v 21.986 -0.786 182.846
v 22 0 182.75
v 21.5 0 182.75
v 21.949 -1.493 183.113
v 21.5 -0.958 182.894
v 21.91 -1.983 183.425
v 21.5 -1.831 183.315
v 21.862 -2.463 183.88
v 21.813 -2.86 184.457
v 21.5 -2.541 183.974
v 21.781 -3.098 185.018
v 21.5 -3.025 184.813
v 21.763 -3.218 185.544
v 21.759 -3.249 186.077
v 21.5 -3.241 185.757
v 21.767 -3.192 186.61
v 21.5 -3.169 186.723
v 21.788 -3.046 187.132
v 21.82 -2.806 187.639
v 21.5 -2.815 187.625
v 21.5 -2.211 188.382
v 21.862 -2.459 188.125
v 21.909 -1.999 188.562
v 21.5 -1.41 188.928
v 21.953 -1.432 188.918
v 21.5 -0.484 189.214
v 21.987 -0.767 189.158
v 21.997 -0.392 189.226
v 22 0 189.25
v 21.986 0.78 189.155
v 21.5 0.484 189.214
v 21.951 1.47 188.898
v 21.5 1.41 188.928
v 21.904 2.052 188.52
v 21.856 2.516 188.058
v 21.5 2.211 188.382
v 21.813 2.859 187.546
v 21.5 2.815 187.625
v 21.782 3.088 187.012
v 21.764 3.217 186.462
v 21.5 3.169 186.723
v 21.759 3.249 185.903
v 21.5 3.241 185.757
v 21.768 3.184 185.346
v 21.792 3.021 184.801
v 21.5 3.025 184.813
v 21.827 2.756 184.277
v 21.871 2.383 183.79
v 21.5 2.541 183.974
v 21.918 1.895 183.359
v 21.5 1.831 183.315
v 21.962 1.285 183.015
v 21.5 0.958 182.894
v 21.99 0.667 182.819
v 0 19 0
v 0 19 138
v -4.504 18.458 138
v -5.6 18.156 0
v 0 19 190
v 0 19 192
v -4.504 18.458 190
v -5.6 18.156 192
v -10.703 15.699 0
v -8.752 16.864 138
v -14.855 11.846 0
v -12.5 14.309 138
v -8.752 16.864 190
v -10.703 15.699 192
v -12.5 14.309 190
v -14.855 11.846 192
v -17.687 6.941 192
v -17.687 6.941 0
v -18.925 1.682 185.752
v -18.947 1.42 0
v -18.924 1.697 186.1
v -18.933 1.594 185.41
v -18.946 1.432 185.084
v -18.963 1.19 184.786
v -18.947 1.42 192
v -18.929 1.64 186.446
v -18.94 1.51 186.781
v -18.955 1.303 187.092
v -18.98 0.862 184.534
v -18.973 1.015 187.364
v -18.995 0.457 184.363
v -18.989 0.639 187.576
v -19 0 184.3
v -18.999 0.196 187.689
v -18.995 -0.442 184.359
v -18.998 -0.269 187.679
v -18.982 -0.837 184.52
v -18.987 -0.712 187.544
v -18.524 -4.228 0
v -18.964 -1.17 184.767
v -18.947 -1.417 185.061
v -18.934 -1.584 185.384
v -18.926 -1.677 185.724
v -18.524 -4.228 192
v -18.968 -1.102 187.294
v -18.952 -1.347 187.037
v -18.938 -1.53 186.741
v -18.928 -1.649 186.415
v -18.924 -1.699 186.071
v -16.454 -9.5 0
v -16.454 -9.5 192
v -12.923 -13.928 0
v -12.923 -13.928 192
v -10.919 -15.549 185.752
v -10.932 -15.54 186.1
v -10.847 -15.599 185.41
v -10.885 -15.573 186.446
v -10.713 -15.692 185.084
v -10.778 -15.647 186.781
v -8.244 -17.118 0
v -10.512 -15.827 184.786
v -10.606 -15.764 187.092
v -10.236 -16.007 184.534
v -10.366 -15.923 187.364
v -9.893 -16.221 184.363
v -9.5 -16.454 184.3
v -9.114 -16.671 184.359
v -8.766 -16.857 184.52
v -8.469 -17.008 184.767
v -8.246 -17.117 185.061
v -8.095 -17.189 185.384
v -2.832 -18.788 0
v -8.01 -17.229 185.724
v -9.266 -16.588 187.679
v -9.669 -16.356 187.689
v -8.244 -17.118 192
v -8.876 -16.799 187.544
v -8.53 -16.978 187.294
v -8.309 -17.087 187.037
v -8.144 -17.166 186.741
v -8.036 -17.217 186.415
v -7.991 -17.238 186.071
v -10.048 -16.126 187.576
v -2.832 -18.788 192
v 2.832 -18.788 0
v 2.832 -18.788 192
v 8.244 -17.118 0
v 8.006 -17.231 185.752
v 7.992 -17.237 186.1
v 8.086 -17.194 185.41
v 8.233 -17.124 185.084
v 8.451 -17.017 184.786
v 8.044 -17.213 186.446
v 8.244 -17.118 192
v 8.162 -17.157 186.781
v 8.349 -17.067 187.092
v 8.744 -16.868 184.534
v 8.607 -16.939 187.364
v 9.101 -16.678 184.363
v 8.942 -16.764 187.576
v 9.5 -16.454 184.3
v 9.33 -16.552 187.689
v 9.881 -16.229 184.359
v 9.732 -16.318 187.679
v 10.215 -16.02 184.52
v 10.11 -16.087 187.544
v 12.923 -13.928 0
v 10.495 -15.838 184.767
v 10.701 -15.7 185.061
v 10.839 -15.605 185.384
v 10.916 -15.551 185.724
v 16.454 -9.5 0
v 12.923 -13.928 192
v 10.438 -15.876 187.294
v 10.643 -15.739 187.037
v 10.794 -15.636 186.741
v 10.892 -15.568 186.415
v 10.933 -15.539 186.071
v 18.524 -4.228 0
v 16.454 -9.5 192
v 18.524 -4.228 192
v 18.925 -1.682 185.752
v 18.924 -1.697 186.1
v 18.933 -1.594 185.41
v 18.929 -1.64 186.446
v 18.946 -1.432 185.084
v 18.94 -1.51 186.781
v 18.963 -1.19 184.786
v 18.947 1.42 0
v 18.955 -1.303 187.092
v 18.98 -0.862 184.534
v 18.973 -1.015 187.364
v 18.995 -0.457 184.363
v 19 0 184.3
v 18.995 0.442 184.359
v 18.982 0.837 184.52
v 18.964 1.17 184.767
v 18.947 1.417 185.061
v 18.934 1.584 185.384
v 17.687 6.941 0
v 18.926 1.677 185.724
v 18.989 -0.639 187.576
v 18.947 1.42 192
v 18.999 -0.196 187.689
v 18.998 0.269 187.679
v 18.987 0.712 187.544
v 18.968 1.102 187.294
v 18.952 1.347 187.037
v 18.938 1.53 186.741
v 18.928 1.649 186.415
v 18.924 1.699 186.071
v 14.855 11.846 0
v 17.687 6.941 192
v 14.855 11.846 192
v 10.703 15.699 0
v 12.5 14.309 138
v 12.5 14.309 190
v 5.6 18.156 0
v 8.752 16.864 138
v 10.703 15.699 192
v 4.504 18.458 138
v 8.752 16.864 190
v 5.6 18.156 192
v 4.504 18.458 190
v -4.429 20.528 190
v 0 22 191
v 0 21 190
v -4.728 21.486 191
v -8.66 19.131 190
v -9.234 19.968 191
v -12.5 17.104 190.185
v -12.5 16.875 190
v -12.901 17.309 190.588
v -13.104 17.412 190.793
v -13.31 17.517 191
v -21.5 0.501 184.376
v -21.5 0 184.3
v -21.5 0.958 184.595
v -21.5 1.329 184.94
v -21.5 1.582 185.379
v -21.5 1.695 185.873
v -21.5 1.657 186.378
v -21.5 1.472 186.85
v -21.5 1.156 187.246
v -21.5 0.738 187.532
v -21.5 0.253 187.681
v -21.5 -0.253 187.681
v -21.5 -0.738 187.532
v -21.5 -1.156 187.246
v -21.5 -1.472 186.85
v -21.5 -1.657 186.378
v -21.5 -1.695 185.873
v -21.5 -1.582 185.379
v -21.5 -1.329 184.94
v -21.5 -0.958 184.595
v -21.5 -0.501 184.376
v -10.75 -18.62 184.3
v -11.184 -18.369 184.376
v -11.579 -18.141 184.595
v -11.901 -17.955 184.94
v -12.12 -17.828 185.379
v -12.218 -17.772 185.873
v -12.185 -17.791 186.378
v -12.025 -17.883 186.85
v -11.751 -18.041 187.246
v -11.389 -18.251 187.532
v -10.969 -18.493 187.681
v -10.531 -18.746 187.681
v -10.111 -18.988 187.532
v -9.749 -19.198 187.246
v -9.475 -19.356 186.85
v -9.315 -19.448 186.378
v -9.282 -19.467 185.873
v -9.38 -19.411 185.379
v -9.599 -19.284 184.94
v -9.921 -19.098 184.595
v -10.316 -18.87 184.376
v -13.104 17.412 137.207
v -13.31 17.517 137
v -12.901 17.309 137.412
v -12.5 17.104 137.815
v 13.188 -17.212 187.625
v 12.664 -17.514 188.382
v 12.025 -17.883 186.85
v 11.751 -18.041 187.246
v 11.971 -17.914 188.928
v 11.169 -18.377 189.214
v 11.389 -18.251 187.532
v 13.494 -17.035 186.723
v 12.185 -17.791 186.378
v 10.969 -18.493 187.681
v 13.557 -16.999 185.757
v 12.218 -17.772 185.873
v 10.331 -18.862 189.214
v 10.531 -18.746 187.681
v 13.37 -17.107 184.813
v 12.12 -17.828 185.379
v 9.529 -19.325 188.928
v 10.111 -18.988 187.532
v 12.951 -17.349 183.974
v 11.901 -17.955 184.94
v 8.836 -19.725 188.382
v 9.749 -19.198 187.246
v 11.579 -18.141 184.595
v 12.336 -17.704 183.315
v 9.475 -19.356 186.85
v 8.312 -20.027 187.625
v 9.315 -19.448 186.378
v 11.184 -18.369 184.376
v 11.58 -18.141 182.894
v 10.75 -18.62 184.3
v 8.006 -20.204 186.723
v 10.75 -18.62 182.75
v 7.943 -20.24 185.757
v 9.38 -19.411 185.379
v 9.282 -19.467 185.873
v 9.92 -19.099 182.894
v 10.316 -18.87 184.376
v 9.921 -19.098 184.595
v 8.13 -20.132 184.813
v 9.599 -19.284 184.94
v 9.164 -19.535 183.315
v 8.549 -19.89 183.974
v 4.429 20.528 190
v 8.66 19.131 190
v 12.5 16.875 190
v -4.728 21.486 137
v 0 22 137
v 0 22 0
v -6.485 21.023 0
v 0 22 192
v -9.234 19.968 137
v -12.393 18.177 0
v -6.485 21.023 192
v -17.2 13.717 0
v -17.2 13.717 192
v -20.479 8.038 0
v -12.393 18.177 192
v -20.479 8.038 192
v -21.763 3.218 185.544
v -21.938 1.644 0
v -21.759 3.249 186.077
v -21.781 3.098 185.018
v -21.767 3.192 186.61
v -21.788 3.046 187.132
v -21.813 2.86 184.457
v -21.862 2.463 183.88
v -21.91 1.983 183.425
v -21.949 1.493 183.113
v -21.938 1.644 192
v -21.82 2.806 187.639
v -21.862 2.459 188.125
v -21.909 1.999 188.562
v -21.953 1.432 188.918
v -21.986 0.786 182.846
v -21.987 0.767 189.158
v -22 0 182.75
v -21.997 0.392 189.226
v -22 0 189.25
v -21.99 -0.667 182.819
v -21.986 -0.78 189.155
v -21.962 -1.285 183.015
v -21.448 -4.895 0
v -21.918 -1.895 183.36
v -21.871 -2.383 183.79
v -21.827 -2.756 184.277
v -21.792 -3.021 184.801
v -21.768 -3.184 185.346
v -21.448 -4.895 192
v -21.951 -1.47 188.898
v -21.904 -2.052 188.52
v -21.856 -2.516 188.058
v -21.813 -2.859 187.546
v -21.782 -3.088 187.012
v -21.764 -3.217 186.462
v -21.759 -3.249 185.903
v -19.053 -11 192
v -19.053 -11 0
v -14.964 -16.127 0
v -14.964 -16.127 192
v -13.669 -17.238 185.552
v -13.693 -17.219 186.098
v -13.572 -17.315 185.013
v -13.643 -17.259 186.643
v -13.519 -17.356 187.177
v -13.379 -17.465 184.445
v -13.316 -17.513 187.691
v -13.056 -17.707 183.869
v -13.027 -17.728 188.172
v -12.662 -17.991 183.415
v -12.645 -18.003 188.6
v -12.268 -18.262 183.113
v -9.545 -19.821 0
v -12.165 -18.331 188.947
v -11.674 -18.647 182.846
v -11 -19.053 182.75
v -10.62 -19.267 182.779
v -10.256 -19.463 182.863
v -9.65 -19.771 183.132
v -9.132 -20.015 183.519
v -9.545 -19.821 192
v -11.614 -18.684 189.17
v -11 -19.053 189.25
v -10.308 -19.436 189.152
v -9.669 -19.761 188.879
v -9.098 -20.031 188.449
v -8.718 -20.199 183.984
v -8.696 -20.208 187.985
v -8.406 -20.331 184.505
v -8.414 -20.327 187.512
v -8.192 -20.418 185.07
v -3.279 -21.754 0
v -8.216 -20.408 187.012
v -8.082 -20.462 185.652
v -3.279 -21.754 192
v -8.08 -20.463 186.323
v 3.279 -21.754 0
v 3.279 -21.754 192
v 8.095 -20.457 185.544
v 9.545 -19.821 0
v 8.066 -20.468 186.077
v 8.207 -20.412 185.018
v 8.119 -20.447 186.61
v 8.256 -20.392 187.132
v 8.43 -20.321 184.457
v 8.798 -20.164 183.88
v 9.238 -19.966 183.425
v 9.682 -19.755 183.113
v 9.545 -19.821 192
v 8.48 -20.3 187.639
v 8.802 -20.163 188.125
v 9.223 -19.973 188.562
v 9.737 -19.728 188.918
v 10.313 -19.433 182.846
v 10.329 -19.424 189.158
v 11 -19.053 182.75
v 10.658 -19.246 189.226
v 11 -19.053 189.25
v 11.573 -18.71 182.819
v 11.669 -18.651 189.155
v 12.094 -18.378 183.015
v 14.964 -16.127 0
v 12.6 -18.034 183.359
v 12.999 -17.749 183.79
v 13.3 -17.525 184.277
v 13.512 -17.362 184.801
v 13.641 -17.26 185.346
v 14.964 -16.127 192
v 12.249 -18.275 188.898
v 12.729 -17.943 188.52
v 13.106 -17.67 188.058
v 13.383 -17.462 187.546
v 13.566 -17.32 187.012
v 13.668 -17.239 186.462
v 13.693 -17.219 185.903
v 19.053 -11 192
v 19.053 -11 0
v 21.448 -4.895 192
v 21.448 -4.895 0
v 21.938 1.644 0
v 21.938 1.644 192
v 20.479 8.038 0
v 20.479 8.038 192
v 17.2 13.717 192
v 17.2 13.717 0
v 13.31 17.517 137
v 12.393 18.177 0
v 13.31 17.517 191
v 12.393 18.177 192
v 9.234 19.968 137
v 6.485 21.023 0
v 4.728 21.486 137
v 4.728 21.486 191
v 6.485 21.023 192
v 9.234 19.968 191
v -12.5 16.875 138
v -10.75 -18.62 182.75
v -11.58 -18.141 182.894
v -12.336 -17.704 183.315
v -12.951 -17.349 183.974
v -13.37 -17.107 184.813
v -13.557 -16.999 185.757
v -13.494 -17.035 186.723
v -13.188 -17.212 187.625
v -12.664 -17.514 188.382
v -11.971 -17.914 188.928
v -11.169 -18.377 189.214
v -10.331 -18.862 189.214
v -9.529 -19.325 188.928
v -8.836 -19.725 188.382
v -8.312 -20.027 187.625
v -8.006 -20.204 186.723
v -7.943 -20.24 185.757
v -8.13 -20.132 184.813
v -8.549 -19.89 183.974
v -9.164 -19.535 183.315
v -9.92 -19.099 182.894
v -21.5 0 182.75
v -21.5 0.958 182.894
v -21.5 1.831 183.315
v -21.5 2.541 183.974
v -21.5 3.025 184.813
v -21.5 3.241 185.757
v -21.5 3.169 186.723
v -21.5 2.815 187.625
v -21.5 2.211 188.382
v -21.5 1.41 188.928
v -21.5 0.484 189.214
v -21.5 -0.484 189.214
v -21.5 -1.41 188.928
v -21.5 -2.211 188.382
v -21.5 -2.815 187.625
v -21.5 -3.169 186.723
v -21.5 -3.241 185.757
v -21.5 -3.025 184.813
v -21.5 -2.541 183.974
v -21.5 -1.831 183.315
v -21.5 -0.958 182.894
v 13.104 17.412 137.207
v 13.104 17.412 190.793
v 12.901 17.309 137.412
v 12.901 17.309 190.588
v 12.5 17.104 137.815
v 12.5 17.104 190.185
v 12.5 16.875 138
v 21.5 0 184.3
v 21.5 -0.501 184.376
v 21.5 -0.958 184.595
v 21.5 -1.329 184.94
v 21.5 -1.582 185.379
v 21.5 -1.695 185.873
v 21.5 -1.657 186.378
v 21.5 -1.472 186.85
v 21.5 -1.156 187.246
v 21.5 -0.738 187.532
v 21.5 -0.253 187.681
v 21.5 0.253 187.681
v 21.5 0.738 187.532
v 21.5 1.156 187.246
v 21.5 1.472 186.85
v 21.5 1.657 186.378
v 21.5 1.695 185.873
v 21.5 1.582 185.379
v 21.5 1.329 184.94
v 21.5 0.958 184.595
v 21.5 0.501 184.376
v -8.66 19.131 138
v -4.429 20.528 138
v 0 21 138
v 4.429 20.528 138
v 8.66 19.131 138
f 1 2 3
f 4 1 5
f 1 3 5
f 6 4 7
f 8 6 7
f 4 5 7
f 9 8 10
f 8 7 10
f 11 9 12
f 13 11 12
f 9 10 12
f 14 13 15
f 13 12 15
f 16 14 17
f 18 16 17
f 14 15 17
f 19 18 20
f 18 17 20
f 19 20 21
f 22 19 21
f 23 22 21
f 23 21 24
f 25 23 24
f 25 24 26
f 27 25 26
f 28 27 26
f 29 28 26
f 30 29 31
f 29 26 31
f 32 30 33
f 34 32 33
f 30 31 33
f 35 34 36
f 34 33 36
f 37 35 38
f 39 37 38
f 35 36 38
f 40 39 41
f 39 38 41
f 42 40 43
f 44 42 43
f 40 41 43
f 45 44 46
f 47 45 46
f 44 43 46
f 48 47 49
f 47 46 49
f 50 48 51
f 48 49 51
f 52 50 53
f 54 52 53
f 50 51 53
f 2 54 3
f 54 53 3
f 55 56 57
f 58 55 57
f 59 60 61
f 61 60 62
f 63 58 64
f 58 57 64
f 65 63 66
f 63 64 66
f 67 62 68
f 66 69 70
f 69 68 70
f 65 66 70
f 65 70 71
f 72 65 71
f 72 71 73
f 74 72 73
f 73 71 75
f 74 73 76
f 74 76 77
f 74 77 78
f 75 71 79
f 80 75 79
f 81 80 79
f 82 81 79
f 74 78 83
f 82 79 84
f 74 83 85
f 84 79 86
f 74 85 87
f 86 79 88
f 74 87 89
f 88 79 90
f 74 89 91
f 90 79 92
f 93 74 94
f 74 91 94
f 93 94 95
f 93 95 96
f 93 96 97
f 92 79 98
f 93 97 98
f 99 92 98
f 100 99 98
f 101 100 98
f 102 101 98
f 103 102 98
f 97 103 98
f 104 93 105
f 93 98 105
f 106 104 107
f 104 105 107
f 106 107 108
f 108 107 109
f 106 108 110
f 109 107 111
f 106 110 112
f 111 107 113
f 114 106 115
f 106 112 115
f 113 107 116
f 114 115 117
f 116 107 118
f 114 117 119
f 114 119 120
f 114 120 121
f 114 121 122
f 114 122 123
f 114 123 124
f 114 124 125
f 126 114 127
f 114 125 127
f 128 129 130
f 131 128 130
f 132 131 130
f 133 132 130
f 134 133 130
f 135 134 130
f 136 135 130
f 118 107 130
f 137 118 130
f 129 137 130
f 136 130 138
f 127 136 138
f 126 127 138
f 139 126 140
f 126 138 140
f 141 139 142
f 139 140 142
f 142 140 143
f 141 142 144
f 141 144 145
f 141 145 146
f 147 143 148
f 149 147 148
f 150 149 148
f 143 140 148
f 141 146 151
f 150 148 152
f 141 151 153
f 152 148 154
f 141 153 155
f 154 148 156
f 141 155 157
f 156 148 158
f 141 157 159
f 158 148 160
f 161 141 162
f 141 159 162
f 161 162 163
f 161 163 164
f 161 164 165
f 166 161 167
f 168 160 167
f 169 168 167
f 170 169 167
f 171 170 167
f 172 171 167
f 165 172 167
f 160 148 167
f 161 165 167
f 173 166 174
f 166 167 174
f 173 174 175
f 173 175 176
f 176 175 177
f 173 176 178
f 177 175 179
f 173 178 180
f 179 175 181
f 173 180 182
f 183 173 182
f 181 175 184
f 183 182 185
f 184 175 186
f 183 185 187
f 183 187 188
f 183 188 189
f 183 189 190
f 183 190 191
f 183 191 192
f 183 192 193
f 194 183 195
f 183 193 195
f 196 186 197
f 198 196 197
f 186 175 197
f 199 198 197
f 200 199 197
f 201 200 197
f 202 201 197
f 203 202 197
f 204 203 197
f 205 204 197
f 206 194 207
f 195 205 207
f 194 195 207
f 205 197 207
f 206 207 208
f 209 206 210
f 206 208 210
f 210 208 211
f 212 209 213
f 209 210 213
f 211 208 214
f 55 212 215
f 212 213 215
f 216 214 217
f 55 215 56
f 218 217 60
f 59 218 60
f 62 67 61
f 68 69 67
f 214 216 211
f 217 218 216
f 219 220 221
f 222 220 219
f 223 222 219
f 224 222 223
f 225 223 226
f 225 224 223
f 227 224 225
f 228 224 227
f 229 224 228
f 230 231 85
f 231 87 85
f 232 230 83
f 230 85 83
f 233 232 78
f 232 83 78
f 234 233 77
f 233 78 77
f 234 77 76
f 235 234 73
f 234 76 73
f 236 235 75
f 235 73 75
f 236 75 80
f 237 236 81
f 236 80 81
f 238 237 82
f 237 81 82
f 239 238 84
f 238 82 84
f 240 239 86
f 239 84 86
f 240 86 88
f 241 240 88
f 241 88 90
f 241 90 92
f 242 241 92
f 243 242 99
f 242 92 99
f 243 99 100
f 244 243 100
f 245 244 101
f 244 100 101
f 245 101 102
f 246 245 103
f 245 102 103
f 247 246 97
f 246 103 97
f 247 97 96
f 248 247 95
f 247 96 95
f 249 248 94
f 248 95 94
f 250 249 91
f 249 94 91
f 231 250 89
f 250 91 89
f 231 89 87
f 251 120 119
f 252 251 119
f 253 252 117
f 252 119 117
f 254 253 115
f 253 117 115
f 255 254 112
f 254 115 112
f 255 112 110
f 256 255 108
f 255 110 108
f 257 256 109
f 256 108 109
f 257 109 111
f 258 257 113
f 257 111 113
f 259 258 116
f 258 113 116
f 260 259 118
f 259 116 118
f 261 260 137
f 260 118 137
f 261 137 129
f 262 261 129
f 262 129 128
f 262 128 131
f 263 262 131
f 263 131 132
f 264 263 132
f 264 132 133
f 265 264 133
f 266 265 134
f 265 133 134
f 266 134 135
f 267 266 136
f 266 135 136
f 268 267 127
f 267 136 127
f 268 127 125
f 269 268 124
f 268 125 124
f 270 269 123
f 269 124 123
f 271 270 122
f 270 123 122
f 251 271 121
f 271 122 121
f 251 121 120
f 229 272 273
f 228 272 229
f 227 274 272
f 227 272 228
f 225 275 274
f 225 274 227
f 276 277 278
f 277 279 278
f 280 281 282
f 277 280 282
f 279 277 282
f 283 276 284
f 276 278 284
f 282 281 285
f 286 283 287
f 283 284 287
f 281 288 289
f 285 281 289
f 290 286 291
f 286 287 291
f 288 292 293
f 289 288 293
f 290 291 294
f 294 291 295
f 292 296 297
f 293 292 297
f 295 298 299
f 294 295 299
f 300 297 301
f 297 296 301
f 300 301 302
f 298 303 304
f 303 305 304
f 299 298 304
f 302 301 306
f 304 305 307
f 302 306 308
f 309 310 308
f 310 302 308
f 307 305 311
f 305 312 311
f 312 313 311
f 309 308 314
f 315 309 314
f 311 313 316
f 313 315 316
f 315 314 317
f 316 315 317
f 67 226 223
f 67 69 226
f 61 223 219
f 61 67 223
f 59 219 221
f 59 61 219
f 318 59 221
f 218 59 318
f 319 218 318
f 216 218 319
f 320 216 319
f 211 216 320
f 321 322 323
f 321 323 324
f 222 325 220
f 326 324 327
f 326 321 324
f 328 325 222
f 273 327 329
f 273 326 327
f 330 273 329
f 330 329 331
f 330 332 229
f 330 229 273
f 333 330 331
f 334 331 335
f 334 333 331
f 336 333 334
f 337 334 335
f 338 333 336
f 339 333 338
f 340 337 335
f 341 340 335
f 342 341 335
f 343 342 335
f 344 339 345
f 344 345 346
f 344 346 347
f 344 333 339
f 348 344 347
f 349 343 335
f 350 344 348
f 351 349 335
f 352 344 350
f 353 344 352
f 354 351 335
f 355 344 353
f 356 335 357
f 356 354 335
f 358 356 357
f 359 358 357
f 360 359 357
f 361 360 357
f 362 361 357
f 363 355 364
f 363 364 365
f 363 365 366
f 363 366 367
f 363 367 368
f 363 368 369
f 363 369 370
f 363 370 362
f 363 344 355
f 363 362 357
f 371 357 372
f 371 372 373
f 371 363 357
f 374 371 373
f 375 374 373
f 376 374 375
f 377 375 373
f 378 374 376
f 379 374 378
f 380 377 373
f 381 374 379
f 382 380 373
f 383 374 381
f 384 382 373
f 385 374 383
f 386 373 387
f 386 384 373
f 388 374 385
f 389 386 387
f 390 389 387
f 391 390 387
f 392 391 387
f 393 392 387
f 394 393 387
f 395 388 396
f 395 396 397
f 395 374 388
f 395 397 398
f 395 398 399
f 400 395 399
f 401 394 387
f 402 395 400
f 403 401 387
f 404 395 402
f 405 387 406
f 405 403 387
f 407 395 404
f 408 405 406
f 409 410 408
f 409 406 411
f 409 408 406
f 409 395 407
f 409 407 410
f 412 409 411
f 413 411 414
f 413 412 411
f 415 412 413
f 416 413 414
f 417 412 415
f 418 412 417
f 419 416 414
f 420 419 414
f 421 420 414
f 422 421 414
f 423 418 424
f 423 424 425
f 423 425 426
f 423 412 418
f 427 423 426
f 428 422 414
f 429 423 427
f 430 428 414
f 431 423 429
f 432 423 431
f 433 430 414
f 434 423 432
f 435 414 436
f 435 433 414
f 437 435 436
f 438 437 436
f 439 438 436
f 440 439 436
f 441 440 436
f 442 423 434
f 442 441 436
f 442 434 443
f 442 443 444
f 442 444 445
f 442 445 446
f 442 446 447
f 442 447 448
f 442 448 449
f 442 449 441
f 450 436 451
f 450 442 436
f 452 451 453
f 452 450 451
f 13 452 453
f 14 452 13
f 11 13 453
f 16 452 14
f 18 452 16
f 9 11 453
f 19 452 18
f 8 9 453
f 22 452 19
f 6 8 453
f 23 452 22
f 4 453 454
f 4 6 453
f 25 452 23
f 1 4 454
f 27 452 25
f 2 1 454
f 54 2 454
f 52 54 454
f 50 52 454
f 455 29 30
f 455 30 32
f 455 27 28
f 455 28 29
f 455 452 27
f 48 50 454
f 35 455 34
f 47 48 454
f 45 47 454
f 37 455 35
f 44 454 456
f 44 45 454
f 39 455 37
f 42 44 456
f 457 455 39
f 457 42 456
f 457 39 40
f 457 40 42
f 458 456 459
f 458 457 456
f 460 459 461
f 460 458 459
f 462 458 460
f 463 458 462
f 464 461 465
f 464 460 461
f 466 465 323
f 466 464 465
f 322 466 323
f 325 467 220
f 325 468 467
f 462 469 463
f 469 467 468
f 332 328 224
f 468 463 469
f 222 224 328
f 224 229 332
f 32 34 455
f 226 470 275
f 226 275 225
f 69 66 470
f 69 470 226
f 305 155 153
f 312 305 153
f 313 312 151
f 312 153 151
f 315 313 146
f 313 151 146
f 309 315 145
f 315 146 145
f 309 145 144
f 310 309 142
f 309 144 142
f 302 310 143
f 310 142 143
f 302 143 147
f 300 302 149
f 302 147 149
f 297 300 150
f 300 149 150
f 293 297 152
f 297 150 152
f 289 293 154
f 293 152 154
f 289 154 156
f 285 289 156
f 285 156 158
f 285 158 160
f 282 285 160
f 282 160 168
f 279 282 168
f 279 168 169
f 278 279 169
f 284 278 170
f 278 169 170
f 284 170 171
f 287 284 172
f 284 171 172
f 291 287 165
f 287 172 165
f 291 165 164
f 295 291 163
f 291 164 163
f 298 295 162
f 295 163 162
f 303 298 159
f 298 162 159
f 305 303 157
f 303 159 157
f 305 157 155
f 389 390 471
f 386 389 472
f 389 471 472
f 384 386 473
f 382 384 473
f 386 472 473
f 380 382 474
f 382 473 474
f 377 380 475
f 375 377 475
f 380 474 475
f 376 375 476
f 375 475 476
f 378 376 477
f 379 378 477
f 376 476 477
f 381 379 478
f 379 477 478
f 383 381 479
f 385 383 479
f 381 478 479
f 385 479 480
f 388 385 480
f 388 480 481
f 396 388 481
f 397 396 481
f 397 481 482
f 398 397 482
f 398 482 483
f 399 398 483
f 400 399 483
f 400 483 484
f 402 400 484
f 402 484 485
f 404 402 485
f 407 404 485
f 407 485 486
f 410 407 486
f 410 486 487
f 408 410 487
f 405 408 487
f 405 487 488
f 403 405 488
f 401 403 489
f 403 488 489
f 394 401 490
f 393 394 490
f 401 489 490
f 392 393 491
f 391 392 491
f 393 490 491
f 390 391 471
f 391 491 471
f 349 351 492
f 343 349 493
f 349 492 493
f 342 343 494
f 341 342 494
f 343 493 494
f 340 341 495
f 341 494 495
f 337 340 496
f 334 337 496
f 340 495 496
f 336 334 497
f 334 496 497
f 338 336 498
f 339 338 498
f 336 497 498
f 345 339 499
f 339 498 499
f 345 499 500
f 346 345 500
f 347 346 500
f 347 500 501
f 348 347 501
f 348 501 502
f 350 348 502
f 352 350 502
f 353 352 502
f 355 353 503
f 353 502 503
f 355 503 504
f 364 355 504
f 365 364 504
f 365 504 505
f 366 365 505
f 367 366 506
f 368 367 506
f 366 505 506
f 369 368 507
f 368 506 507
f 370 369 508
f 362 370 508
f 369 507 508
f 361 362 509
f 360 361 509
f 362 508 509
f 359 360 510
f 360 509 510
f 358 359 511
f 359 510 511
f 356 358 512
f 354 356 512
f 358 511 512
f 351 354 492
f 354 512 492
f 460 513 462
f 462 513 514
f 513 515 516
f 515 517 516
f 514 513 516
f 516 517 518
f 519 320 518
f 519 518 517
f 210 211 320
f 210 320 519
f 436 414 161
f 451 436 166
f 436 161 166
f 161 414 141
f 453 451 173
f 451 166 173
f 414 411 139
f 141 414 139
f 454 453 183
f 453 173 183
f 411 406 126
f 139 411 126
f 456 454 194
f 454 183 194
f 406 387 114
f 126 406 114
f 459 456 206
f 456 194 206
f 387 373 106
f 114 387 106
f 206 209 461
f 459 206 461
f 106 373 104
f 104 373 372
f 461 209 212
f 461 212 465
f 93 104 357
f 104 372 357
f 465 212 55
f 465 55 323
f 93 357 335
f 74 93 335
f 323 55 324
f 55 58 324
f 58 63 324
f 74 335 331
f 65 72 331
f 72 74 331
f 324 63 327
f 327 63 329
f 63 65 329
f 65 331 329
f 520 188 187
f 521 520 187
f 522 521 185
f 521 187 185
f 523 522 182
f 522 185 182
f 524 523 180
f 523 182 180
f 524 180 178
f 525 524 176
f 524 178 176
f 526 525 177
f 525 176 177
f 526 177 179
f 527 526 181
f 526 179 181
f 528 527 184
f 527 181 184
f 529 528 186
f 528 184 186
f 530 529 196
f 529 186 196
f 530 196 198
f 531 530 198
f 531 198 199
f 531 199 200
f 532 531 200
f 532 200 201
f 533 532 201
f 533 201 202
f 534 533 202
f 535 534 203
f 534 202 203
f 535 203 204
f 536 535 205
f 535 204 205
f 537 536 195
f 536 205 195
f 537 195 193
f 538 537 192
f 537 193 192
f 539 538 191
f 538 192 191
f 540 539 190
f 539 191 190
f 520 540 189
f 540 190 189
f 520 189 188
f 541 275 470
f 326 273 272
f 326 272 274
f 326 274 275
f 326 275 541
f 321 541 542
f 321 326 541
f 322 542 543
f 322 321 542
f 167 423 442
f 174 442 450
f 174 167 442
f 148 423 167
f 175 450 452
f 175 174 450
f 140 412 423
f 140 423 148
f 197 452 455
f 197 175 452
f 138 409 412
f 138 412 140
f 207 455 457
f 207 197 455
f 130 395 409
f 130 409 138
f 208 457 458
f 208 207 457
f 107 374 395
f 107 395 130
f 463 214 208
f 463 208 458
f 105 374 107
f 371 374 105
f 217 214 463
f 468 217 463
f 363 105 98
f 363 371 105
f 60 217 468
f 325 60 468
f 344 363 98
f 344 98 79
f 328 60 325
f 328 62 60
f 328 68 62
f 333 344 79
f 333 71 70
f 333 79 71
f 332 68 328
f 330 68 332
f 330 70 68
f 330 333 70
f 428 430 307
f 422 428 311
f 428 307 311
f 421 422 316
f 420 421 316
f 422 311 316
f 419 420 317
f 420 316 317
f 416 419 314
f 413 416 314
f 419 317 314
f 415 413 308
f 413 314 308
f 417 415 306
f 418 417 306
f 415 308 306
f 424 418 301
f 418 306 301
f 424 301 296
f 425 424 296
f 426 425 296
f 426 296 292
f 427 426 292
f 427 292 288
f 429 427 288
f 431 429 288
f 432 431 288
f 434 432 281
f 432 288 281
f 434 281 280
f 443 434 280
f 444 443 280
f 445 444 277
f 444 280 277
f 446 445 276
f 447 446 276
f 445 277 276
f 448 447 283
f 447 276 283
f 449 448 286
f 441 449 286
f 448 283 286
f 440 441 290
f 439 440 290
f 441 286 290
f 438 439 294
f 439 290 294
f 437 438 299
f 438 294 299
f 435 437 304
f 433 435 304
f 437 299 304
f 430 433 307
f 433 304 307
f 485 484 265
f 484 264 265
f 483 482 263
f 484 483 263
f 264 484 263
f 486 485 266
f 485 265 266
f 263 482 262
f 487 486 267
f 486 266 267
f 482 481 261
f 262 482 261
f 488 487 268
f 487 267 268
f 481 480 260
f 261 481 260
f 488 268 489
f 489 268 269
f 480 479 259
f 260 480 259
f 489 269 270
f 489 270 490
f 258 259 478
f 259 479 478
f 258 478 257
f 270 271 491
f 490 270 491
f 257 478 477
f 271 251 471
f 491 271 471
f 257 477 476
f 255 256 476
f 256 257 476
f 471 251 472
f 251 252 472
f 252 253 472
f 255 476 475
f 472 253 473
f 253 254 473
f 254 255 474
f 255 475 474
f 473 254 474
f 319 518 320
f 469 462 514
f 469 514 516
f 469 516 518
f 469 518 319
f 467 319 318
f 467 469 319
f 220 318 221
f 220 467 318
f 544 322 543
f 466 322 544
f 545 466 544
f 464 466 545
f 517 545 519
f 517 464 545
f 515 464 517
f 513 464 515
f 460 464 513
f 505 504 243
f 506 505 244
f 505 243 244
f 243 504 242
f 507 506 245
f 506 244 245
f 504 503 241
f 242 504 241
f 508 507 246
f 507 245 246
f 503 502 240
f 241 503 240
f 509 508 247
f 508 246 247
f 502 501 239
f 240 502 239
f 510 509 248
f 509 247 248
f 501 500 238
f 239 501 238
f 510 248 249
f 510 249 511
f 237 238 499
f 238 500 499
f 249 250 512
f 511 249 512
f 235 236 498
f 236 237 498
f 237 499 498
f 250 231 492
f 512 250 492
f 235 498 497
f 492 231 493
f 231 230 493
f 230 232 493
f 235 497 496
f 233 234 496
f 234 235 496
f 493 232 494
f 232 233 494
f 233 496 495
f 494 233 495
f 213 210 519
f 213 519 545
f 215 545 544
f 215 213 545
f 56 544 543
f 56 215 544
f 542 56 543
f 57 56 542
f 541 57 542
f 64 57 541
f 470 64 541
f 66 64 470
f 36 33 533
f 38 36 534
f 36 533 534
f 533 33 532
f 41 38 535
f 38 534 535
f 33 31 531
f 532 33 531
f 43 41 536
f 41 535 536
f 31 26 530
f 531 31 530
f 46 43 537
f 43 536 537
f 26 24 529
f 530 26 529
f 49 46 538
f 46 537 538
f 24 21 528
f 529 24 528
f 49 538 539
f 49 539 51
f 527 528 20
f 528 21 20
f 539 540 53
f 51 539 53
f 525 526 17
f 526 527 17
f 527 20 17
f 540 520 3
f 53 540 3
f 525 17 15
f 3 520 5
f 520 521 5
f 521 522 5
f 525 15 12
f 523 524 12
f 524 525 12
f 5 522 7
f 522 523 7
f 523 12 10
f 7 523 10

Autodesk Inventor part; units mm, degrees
ref_plane "XY Plane" through (0, 0, 0) normal (0, 0, 1) x (1, 0, 0)
sketch "Esquisse1" plane through (0, 0, 0) normal (1, 0, 0) x (0, 1, 0)
  line L0 (0, 0) -> (0, 594.5025)
  line L1 (22, 0) -> (22, 192)
  line L2 (19, 0) -> (19, 192)
  line L3 (22, 192) -> (19, 192)
  line L4 (22, 0) -> (19, 0)
  dimension "d0" = 38
  dimension "d3" = 3
  dimension "d58" = 192
revolve "Révolution1" add sketch "Esquisse1" angle 360 about axis through (0, 0, 0) along (0, 0, 1)
sketch "Esquisse3" plane through (0, 0, 0) normal (0, 1, 0) x (-1, 0, 0)
  line L0 (-19, 192) -> (19, 192) projected
  line L1 (12.5, 190) -> (-12.5, 190)
  line L2 (-12.5, 190) -> (-12.5, 138)
  line L3 (-12.5, 138) -> (12.5, 138)
  line L4 (12.5, 138) -> (12.5, 190)
  point P0 (0, 0)
  point P1 (0, 190)
  point P2 (0, 192)
  dimension "d108" = 52
  dimension "d109" = 2
  dimension "d110" = 25
extrude "Extrusion2" cut sketch "Esquisse3" along normal up to surface
ref_plane "Plan de construction2" through (22, 0, 96) normal (1, 0, 0) x (0, 1, 0)
sketch "Esquisse4" plane through (22, 0, 96) normal (1, 0, 0) x (0, 1, 0)
  line L0 (-22, 96) -> (22, 96) projected
  point P0 (0, -96)
  point P1 (0, 90)
  dimension "d24" = 6
hole "Perçage1" at (22, 0, 186) direction (-1, 0, 0) diameter 3.4 depth 8 counterbore diameter 6.5 counterbore depth 0.5 clearance for "Vis d'assemblage à six pans creux ISO 4762" size "M3" standard "ISO"
pattern_circular "Réseau circulaire2" count 4 over 180 about axis through (0, 0, -10) along (0, 0, -1) of "Perçage1"
chamfer "Chanfrein2" distance 1 angle 45 6 edges at (-12.5, 18.1039, 164) (-6.5466, 21.0034, 138) (6.5466, 21.0034, 138) (12.5, 18.1039, 164) (-6.5466, 21.0034, 190) (6.5466, 21.0034, 190)
ref_plane "Plan de construction3" through (0, -22, 96) normal (0, 1, 0) x (-1, 0, 0)
thread "Filetage3" size "M38x1.5" class "6H" standard "ISO Metric profile" length 10
properties part number "reservoir_guide"
